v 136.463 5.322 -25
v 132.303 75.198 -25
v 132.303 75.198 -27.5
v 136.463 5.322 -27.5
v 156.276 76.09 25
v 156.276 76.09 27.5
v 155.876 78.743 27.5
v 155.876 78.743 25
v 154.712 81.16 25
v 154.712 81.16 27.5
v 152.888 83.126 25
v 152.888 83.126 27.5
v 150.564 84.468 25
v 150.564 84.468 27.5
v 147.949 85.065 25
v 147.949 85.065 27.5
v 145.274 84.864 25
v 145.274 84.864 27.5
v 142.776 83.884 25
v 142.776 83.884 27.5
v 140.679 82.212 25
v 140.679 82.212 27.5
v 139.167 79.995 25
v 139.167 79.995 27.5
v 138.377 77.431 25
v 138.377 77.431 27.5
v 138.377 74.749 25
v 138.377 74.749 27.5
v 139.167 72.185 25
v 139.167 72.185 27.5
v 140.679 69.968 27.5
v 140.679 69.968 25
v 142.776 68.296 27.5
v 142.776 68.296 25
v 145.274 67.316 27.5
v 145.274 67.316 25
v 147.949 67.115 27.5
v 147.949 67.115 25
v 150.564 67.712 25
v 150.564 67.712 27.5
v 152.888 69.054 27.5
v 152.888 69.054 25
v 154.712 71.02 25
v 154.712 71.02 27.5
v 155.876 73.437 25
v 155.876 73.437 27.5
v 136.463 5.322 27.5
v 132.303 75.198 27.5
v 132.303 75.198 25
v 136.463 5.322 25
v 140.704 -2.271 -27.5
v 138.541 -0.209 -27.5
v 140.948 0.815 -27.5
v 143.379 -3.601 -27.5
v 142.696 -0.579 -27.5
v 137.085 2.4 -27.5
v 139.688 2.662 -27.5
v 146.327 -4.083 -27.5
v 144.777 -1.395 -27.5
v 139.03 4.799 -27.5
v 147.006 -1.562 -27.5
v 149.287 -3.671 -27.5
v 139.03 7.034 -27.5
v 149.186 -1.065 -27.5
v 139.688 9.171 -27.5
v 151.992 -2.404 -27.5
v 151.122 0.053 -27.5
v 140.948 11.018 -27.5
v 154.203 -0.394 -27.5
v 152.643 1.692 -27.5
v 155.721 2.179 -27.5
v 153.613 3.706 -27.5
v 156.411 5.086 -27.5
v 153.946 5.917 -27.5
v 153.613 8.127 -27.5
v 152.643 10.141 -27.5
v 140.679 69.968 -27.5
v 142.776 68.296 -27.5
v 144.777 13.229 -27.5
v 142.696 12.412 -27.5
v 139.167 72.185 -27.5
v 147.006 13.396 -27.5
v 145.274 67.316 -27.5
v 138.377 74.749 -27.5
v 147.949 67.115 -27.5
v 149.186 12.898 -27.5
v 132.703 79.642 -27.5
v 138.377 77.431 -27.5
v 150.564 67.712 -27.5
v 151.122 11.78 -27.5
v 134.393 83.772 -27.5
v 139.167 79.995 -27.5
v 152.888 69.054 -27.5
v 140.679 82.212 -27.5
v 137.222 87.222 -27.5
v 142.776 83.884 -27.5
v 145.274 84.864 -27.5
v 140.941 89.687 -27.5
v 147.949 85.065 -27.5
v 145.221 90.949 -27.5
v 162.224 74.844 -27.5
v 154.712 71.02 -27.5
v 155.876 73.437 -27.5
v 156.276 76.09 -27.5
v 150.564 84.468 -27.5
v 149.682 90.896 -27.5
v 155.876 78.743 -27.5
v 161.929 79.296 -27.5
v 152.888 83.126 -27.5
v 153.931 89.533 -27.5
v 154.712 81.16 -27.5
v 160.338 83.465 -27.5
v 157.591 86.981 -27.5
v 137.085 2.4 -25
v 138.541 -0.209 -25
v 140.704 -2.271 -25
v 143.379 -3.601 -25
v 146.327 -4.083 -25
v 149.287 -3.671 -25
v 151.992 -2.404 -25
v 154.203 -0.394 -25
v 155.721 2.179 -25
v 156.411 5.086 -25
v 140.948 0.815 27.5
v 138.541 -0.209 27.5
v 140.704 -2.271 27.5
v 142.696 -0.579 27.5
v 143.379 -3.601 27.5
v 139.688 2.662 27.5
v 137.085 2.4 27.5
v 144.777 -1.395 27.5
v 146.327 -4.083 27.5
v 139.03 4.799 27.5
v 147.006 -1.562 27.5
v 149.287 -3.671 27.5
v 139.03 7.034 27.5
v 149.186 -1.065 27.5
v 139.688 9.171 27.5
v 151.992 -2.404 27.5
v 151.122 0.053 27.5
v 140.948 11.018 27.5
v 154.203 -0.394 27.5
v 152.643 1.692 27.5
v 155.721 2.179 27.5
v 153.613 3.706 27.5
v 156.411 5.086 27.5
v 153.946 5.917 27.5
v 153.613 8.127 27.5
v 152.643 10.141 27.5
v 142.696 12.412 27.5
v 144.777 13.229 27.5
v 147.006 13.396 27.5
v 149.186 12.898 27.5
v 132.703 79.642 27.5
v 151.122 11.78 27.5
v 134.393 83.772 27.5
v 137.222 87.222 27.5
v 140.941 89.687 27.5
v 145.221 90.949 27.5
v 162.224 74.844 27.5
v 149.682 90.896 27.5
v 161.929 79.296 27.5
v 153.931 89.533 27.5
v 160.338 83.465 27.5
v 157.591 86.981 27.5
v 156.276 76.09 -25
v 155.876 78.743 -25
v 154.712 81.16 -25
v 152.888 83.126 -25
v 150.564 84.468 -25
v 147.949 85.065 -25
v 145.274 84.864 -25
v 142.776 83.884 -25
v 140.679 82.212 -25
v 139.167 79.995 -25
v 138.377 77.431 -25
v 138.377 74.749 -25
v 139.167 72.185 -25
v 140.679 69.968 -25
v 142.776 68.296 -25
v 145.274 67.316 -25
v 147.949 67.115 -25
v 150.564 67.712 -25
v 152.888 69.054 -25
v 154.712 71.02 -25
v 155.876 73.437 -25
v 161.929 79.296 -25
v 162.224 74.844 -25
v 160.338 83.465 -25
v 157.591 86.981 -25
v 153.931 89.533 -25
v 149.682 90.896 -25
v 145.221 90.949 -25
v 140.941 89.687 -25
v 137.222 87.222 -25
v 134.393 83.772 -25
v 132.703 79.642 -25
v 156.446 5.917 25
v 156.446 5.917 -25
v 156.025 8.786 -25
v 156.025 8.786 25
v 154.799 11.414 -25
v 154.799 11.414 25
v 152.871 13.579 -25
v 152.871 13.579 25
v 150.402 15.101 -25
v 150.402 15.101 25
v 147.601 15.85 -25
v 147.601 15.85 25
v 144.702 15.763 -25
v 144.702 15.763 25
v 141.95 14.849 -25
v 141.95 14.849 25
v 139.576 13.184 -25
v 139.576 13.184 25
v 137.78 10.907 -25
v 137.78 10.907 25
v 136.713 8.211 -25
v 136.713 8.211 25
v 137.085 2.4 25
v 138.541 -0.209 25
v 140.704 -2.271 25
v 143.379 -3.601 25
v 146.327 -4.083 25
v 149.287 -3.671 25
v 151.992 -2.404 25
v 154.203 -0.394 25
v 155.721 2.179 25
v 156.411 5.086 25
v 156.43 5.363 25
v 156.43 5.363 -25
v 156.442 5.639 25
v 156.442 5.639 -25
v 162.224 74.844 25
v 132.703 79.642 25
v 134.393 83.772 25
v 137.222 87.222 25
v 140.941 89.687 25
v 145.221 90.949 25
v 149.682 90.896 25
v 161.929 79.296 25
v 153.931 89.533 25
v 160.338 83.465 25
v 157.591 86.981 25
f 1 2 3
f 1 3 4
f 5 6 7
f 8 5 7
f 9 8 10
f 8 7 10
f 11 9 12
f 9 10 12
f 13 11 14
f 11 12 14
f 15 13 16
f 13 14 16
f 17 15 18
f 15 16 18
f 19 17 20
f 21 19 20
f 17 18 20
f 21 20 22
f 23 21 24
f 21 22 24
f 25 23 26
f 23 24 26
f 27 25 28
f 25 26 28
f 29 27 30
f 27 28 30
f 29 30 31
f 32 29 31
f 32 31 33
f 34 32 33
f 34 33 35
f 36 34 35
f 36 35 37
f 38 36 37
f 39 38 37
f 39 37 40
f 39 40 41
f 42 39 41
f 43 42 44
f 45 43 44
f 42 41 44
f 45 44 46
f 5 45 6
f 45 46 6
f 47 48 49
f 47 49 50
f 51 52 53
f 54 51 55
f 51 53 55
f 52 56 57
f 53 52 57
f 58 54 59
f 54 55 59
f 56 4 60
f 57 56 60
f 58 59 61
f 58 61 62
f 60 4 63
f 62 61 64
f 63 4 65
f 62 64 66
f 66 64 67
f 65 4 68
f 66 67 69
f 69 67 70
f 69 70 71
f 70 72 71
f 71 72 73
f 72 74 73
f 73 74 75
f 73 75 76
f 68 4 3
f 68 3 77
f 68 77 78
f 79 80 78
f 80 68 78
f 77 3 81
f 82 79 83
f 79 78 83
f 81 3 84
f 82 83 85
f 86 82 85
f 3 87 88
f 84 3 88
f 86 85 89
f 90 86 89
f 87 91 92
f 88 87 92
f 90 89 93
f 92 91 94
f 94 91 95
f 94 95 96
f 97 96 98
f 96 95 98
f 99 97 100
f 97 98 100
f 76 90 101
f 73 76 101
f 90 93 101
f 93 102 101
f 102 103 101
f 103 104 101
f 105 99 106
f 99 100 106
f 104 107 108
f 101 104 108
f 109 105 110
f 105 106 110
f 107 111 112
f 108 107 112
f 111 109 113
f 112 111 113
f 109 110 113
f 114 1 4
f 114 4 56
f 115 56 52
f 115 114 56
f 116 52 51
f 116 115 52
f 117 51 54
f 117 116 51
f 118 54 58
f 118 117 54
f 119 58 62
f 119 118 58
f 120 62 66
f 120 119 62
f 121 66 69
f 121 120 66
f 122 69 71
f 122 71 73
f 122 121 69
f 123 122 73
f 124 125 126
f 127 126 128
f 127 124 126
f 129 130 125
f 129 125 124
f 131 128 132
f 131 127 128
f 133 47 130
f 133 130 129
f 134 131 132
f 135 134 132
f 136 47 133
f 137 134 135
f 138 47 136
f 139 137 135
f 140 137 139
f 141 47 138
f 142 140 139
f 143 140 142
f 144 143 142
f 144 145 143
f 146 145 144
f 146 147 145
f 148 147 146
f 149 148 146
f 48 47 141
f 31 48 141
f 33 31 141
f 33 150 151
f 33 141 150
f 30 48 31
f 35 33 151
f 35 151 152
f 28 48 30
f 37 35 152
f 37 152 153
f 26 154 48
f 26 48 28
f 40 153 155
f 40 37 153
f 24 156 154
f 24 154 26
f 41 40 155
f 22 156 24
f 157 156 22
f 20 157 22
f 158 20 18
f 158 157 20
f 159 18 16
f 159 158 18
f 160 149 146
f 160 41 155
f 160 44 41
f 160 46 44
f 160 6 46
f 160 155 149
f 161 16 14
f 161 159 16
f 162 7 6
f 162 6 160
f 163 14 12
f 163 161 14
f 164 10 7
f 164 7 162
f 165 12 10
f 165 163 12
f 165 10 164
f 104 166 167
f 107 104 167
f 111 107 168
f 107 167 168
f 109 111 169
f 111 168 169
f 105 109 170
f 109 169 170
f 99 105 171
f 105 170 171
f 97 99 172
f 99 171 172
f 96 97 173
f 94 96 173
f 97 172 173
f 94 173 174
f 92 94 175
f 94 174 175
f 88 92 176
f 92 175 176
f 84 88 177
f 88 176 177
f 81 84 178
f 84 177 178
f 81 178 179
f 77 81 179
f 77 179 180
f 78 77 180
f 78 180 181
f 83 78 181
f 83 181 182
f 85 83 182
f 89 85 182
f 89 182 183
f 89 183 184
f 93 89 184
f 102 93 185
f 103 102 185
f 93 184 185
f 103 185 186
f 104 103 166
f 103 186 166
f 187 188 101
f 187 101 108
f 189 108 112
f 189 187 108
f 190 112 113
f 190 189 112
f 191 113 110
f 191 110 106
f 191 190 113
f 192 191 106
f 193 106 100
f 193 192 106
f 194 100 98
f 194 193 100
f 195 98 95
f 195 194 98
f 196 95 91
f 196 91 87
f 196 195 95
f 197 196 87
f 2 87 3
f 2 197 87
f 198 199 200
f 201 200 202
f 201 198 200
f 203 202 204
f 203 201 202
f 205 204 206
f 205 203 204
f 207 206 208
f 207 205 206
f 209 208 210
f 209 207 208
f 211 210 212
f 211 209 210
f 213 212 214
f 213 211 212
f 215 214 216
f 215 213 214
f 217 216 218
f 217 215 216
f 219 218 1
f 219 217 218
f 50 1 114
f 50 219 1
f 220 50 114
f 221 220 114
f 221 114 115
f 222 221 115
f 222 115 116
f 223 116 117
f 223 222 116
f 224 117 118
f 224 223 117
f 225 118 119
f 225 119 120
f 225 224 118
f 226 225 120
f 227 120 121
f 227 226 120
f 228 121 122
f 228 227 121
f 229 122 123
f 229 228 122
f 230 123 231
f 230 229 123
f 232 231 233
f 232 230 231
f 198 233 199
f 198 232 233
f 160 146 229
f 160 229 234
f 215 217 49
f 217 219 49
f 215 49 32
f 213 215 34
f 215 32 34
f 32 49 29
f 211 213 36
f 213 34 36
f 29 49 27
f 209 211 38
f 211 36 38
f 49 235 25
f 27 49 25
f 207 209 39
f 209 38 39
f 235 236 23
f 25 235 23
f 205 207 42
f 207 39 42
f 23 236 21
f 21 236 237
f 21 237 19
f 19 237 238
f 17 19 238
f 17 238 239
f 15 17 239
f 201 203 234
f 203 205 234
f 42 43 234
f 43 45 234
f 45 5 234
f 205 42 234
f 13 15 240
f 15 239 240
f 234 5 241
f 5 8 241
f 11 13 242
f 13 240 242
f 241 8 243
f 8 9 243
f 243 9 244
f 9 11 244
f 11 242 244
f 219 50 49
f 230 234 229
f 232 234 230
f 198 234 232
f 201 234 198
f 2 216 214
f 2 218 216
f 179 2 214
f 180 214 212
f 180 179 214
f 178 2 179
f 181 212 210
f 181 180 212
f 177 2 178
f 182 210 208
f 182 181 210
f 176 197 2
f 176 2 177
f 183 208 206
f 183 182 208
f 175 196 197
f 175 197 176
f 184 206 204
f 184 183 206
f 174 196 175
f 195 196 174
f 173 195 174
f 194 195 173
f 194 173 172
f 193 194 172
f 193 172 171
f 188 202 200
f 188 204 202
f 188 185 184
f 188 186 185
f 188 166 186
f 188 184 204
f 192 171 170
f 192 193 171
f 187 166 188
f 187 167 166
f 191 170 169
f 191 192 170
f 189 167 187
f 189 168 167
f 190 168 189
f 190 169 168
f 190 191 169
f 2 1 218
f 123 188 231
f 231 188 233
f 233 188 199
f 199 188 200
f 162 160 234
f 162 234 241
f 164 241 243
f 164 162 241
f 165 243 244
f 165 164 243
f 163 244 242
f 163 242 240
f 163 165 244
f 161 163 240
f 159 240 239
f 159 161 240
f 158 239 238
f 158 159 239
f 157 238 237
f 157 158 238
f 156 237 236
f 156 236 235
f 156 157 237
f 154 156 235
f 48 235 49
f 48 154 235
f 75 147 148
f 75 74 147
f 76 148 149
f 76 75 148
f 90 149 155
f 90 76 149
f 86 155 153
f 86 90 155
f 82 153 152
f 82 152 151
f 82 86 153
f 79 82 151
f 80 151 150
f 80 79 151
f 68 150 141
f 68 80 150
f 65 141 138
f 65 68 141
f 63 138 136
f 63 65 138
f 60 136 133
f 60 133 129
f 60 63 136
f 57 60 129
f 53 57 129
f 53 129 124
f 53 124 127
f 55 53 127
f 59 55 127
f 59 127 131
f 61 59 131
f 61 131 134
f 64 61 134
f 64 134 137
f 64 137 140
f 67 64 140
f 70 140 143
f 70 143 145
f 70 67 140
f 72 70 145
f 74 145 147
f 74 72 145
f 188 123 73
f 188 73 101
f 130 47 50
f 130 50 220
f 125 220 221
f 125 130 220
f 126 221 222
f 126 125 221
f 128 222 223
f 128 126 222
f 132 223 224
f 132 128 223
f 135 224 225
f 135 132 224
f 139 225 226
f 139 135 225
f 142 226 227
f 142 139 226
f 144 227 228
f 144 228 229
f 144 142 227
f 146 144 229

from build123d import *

# Parameters (mm, degrees)
EXTRUDE_START   = -25
SKETCH_1_R      = 9
SKETCH_1_R_2    = 7.5
EXTRUDE_1_DEPTH = 2.5
SKETCH_5_R      = 10
SKETCH_5_R_2    = 7.5
EXTRUDE_5_DEPTH = 27.5
EXTRUDE_START_2 = 27.5
SKETCH_1_3_R    = 9
SKETCH_1_3_R_2  = 7.5
EXTRUDE_6_DEPTH = 2.5


with BuildPart() as part:
    # 草圖1 → 填料-伸長1 (new body)
    with BuildSketch(Plane.XY.offset(EXTRUDE_START)):
        with BuildLine():
            Line((132.302720539, 75.19843017), (136.463425545, 5.322192908))
            ThreePointArc((136.463425545, 5.322192908), (146.327410245, -4.082720481), (156.411202737, 5.086124539))
            Line((156.411202737, 5.086124539), (162.224386326, 74.844327616))
            ThreePointArc((162.224386326, 74.844327616), (147.453702316, 91.088959541), (132.302720539, 75.19843017))
        make_face()
        with Locations((147.276199953, 76.090009814)):
            Circle(SKETCH_1_R, mode=Mode.SUBTRACT)
        with Locations((146.445745154, 5.916579337)):
            Circle(SKETCH_1_R_2, mode=Mode.SUBTRACT)
    extrude(amount=-EXTRUDE_1_DEPTH)

    # 草圖5 → 填料-伸長5 (add, symmetric)
    with BuildSketch(Plane.XY):
        with Locations((146.445745154, 5.916579337)):
            Circle(SKETCH_5_R)
        with Locations((146.445745154, 5.916579337)):
            Circle(SKETCH_5_R_2, mode=Mode.SUBTRACT)
    extrude(amount=EXTRUDE_5_DEPTH, both=True)

    # 草圖1<3> → 填料-伸長6 (add)
    with BuildSketch(Plane.XY.offset(EXTRUDE_START_2)):
        with BuildLine():
            Line((132.302720539, 75.19843017), (136.463425545, 5.322192908))
            ThreePointArc((136.463425545, 5.322192908), (146.327410245, -4.082720481), (156.411202737, 5.086124539))
            Line((156.411202737, 5.086124539), (162.224386326, 74.844327616))
            ThreePointArc((162.224386326, 74.844327616), (147.453702316, 91.088959541), (132.302720539, 75.19843017))
        make_face()
        with Locations((147.276199953, 76.090009814)):
            Circle(SKETCH_1_3_R, mode=Mode.SUBTRACT)
        with Locations((146.445745154, 5.916579337)):
            Circle(SKETCH_1_3_R_2, mode=Mode.SUBTRACT)
    extrude(amount=-EXTRUDE_6_DEPTH)


solid = part.part
